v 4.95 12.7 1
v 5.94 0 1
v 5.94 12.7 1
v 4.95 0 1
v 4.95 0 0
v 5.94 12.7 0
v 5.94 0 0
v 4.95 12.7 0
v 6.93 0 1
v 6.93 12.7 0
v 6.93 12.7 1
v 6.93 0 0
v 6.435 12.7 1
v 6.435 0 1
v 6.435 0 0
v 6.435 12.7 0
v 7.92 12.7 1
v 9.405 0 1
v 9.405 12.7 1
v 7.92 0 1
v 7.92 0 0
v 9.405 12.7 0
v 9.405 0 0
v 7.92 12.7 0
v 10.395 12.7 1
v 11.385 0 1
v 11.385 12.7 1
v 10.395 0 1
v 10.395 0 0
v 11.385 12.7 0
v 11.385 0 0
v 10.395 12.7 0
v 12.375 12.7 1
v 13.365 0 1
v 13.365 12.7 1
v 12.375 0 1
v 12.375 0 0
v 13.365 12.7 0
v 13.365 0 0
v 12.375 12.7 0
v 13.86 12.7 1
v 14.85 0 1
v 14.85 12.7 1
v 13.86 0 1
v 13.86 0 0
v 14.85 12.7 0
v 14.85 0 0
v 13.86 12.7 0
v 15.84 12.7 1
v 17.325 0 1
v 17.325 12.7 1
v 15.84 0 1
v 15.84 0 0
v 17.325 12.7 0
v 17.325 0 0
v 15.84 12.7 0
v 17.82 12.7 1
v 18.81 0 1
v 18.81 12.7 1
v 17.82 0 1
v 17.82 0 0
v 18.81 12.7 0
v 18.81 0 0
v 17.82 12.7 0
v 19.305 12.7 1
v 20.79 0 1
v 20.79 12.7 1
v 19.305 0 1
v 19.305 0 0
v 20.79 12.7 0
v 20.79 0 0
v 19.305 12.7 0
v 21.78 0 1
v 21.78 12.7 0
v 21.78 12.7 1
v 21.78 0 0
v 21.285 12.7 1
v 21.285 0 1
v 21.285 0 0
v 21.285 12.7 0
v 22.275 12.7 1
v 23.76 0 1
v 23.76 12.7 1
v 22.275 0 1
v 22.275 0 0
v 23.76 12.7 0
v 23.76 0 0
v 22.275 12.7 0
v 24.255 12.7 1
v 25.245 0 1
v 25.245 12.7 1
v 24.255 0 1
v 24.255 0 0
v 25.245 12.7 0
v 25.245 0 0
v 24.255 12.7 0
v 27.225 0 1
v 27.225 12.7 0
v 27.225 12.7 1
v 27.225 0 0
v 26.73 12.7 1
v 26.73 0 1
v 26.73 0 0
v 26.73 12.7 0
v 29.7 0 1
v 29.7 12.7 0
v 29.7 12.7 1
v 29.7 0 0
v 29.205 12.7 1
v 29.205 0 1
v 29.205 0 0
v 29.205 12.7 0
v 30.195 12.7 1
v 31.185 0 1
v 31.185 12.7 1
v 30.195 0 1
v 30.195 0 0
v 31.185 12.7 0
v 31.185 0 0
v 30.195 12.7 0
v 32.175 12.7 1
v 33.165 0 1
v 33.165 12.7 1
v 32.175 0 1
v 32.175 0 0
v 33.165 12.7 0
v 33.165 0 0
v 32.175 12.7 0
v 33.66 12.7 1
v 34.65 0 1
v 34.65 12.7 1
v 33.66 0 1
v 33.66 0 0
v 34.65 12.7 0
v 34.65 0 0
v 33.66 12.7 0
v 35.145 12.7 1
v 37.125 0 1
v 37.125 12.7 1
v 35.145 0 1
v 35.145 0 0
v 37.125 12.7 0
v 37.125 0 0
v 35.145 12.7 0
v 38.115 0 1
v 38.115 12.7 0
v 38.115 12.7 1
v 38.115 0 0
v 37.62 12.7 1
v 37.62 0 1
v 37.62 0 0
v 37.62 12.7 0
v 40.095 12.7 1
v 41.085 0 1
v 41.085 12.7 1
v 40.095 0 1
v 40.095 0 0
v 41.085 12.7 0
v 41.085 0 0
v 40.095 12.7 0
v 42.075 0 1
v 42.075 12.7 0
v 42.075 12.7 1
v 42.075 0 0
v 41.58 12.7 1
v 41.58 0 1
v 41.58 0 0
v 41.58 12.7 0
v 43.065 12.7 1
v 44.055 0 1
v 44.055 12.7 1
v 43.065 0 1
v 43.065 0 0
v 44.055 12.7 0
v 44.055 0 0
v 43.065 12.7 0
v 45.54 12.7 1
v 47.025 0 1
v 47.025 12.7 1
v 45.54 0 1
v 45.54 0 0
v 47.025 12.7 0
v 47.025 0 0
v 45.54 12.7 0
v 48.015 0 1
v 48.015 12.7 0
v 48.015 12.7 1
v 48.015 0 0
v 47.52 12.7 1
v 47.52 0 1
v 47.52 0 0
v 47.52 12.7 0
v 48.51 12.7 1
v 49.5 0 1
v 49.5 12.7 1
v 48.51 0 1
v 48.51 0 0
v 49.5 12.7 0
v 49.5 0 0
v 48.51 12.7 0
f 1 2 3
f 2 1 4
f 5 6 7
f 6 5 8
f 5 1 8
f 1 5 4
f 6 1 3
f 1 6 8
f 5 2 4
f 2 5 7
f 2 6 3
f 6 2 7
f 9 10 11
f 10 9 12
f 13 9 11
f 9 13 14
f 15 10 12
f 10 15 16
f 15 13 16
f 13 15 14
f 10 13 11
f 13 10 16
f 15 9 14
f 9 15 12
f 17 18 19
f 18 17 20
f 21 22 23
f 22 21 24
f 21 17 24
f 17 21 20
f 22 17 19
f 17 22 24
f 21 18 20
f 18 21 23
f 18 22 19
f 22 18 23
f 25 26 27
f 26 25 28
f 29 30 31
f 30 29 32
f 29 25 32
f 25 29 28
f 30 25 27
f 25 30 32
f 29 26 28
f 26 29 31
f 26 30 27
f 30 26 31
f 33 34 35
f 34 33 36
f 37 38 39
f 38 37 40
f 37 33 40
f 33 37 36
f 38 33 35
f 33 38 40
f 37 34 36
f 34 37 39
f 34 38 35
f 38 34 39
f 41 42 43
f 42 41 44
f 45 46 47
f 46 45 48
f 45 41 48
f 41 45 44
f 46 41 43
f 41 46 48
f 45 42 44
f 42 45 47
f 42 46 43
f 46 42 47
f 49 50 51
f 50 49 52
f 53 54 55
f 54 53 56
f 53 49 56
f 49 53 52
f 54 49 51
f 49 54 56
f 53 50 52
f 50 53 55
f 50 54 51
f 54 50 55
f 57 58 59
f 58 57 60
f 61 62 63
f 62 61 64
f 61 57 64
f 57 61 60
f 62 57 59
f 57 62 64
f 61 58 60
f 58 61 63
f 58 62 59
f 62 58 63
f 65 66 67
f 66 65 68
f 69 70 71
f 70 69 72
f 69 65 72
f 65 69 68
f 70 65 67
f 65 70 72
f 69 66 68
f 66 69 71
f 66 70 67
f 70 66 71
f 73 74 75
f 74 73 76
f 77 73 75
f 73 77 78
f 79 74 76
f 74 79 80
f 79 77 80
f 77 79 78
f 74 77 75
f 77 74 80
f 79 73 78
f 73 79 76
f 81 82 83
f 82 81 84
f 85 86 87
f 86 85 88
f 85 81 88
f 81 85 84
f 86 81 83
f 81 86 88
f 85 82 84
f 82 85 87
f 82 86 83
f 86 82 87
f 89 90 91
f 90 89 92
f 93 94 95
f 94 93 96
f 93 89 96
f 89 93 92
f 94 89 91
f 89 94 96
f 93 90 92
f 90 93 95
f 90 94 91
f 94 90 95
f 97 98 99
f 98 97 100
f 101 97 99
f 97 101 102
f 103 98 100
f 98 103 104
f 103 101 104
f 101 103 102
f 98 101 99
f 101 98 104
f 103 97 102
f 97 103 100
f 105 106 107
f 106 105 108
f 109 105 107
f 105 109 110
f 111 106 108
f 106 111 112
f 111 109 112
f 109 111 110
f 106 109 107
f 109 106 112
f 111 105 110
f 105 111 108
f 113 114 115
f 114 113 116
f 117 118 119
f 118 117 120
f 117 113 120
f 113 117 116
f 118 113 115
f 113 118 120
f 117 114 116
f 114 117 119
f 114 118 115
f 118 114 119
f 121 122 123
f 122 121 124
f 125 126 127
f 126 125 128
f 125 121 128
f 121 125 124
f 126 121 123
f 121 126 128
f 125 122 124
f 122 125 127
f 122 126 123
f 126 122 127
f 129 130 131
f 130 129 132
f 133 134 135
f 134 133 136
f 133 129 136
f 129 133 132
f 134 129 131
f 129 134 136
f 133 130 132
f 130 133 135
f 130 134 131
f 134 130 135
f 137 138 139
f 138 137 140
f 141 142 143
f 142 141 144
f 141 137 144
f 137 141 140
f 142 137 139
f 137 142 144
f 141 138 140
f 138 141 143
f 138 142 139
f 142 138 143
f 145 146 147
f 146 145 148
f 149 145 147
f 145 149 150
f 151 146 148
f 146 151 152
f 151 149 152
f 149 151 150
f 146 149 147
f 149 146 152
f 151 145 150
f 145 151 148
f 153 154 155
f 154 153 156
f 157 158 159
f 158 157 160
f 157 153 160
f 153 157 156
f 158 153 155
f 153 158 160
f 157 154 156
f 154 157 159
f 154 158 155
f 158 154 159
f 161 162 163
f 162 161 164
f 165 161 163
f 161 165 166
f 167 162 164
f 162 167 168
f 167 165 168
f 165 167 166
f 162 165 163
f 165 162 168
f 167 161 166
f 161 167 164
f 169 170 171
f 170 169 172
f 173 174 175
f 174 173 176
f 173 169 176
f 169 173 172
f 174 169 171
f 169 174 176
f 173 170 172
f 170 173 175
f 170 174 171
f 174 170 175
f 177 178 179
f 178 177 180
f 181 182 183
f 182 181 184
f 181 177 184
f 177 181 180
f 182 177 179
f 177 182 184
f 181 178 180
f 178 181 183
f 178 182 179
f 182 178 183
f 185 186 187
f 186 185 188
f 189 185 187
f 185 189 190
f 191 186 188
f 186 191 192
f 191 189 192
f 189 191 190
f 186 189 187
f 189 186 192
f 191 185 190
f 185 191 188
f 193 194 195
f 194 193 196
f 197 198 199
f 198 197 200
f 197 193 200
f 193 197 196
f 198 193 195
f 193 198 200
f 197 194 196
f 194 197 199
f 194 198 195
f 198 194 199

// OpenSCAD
// file: ../../util/bitmap.scad
/*****************************************************************************
 * Module Bitmap Library
 * Modules to create bitmaps of unit squares from 1 or 2 dimensional vectors.
 *****************************************************************************
 * Copyright 2017 Chris Baker
 *
 * This program is free software: you can redistribute it and/or modify
 * it under the terms of the GNU Lesser General Public License as published by
 * the Free Software Foundation, either version 3 of the License, or
 * (at your option) any later version.
 *
 * This program is distributed in the hope that it will be useful,
 * but WITHOUT ANY WARRANTY; without even the implied warranty of
 * MERCHANTABILITY or FITNESS FOR A PARTICULAR PURPOSE.  See the
 * GNU Lesser General Public License for more details.
 *
 * You should have received a copy of the GNU Lesser General Public License
 * along with this program.  If not, see <http://www.gnu.org/licenses/>.
 *****************************************************************************
 * Usage:
 * Include this file with the "use" tag.
 * Depends on compat.scad library.
 *
 * API:
 *   1dbitmap(bitmap, center, expansion, vector_mode)
 *   2dbitmap(bitmap, center, expansion, vector_mode)
 *     Generate a 1 or 2-Dimensional field of modules based on the provided
 *     bitmap vector. See Bitmap Vectors below.
 *     The center flag determines whether to center the bitmap on the origin.
 *     The expansion value actually shrinks each cube in the x and y
 *     dimension by the specified amount.
 *     The vector_mode flag determines whether to create 3D solid geometry
 *     (unit cubes) or 2D vector geometry (squares).
 *
 * Bitmap Vectors:
 *   The bitmap vectors primarily provide boolean information.
 *   A module will be placed where these vectors have a postive value and
 *   skipped where they have a negative value. I.E. 0, -1, false, and undef
 *   are all equivalent and result in a skip. 1 and true are equivalent and
 *   result in a placed 1-unit module.
 *   Further, if the value is an integer it will be treated as a height for
 *   the module, allowing z-maps to be created.
 *   If the value is not an integer or boolean, it will be treated as a color
 *   reference. This can be a string or RGBA vector that will be used to
 *   color the module in the OpenSCAD preview window.
 *   In current versions of OpenSCAD, the color has no effect in the rendered
 *   view or STL output.
 *
 * Vector Mode:
 *   Although OpenSCAD supports generating 2D geometry, there are several
 *   caveats:
 *   - 2D and 3D geometry cannot be mixed
 *   - Extruding 2D geometry causes color information to be lost
 *   - All 2D geometry is projected onto the XY plane when rendering
 *   - Rendering also results in loss of color (same as 3D)
 *   - The SVG exporter is somewhat limited:
 *     - The pixel size of the image is hard-coded in the file
 *     - The title of the image is a generic string
 *     - The color selection for stroke and fill is fixed
 *     - The stroke-width is set to a large value that will cause overlap
 *     - The background is transparent
 *     - Only one path element is created with all of the geometry; there is
 *       no easy way to split up the geometry into multiple logical units.
 *     - These issues can mostly be resolved by hand-editing the file:
 *       - Remove or modify the width and height parameters from the svg
 *         element at the top of the file to provide better scaling.
 *       - Edit the title element at the top of the file to change the title.
 *       - Edit the stroke and fill parameters of the path element (these will
 *         probably be at the end of the file).
 *       - Set the stroke-width parameter for the path element to 0.
 *****************************************************************************/
use <compat.scad>

/*
 * 2dbitmap - Turn a 2D vector into a bitmap of cubes
 *
 * bitmap - 2D vector representing where to place each cube
 *          Value can either be boolean, z-height, or color
 * center - center cubes around the origin
 * expansion - size of gap around each pixel (screendoor)
 * vector_mode - create a 2D vector drawing instead of 3D extrusion
 */
module 2dbitmap(bitmap=[[1,0],[0,1]], center=false, expansion=0, vector_mode=false)
{
	ylen=len(bitmap)-1;

	for (y=[0:ylen]) {
		xlen=len(bitmap[y])-1;
		for (x=[0:xlen])
			translate([x-(center?xlen/2:0),ylen-y-(center?ylen/2:0),0])
				if (is_indexable(bitmap[y][x]))
					color(bitmap[y][x])
						if (vector_mode)
							square([1-expansion,1-expansion], center=center);
						else
							cube([1-expansion,1-expansion,1], center=center);
				else
					if (bitmap[y][x])
						if (vector_mode)
							square([1-expansion,1-expansion], center=center);
						else
							cube([1-expansion,1-expansion,clamp_nonnum(bitmap[y][x])], center=center);
	}
}

module 1dbitmap(bitmap=[1,0,1,0,1], center=false, expansion=0, vector_mode=false)
	2dbitmap([bitmap], center, expansion, vector_mode);

/*
 * Examples
 */

// 1D with z-height
translate([10,0,0]) scale([1,10,1])
	1dbitmap(bitmap=[1,1,0,2,0,0,3], expansion=.1);

// 1D with boolean
translate([-20,0,0]) scale([1,10,1])
	1dbitmap(bitmap=[true,false,true,false,true,true]);

// 2D with z-height
scale([2,2,1])
	2dbitmap(bitmap=[[1,0,2,1],[0,3,3,0],[1,1,0,1]],
		center=true);

// 1D with color
translate([0,-10,0]) scale([1,3,1])
	1dbitmap(bitmap=["red","white","blue",[0,0.3,0,0.5]]);

// 1D with color using 2D-vector-mode
translate([-7,-8,0]) scale([1,2])
	1dbitmap(bitmap=["red",0,"blue",0,"green"], vector_mode=true);
translate([-4.5,-10,0]) scale([1,2])
	1dbitmap(bitmap=["red",0,"blue",0,"green"], vector_mode=true, center=true);
// main file
/* Unit Test 03: 128C */
use <../code128.scad>

code_128(cs128_c([0,1,2,3,4,5,6,7,8,9]), bar="black");
